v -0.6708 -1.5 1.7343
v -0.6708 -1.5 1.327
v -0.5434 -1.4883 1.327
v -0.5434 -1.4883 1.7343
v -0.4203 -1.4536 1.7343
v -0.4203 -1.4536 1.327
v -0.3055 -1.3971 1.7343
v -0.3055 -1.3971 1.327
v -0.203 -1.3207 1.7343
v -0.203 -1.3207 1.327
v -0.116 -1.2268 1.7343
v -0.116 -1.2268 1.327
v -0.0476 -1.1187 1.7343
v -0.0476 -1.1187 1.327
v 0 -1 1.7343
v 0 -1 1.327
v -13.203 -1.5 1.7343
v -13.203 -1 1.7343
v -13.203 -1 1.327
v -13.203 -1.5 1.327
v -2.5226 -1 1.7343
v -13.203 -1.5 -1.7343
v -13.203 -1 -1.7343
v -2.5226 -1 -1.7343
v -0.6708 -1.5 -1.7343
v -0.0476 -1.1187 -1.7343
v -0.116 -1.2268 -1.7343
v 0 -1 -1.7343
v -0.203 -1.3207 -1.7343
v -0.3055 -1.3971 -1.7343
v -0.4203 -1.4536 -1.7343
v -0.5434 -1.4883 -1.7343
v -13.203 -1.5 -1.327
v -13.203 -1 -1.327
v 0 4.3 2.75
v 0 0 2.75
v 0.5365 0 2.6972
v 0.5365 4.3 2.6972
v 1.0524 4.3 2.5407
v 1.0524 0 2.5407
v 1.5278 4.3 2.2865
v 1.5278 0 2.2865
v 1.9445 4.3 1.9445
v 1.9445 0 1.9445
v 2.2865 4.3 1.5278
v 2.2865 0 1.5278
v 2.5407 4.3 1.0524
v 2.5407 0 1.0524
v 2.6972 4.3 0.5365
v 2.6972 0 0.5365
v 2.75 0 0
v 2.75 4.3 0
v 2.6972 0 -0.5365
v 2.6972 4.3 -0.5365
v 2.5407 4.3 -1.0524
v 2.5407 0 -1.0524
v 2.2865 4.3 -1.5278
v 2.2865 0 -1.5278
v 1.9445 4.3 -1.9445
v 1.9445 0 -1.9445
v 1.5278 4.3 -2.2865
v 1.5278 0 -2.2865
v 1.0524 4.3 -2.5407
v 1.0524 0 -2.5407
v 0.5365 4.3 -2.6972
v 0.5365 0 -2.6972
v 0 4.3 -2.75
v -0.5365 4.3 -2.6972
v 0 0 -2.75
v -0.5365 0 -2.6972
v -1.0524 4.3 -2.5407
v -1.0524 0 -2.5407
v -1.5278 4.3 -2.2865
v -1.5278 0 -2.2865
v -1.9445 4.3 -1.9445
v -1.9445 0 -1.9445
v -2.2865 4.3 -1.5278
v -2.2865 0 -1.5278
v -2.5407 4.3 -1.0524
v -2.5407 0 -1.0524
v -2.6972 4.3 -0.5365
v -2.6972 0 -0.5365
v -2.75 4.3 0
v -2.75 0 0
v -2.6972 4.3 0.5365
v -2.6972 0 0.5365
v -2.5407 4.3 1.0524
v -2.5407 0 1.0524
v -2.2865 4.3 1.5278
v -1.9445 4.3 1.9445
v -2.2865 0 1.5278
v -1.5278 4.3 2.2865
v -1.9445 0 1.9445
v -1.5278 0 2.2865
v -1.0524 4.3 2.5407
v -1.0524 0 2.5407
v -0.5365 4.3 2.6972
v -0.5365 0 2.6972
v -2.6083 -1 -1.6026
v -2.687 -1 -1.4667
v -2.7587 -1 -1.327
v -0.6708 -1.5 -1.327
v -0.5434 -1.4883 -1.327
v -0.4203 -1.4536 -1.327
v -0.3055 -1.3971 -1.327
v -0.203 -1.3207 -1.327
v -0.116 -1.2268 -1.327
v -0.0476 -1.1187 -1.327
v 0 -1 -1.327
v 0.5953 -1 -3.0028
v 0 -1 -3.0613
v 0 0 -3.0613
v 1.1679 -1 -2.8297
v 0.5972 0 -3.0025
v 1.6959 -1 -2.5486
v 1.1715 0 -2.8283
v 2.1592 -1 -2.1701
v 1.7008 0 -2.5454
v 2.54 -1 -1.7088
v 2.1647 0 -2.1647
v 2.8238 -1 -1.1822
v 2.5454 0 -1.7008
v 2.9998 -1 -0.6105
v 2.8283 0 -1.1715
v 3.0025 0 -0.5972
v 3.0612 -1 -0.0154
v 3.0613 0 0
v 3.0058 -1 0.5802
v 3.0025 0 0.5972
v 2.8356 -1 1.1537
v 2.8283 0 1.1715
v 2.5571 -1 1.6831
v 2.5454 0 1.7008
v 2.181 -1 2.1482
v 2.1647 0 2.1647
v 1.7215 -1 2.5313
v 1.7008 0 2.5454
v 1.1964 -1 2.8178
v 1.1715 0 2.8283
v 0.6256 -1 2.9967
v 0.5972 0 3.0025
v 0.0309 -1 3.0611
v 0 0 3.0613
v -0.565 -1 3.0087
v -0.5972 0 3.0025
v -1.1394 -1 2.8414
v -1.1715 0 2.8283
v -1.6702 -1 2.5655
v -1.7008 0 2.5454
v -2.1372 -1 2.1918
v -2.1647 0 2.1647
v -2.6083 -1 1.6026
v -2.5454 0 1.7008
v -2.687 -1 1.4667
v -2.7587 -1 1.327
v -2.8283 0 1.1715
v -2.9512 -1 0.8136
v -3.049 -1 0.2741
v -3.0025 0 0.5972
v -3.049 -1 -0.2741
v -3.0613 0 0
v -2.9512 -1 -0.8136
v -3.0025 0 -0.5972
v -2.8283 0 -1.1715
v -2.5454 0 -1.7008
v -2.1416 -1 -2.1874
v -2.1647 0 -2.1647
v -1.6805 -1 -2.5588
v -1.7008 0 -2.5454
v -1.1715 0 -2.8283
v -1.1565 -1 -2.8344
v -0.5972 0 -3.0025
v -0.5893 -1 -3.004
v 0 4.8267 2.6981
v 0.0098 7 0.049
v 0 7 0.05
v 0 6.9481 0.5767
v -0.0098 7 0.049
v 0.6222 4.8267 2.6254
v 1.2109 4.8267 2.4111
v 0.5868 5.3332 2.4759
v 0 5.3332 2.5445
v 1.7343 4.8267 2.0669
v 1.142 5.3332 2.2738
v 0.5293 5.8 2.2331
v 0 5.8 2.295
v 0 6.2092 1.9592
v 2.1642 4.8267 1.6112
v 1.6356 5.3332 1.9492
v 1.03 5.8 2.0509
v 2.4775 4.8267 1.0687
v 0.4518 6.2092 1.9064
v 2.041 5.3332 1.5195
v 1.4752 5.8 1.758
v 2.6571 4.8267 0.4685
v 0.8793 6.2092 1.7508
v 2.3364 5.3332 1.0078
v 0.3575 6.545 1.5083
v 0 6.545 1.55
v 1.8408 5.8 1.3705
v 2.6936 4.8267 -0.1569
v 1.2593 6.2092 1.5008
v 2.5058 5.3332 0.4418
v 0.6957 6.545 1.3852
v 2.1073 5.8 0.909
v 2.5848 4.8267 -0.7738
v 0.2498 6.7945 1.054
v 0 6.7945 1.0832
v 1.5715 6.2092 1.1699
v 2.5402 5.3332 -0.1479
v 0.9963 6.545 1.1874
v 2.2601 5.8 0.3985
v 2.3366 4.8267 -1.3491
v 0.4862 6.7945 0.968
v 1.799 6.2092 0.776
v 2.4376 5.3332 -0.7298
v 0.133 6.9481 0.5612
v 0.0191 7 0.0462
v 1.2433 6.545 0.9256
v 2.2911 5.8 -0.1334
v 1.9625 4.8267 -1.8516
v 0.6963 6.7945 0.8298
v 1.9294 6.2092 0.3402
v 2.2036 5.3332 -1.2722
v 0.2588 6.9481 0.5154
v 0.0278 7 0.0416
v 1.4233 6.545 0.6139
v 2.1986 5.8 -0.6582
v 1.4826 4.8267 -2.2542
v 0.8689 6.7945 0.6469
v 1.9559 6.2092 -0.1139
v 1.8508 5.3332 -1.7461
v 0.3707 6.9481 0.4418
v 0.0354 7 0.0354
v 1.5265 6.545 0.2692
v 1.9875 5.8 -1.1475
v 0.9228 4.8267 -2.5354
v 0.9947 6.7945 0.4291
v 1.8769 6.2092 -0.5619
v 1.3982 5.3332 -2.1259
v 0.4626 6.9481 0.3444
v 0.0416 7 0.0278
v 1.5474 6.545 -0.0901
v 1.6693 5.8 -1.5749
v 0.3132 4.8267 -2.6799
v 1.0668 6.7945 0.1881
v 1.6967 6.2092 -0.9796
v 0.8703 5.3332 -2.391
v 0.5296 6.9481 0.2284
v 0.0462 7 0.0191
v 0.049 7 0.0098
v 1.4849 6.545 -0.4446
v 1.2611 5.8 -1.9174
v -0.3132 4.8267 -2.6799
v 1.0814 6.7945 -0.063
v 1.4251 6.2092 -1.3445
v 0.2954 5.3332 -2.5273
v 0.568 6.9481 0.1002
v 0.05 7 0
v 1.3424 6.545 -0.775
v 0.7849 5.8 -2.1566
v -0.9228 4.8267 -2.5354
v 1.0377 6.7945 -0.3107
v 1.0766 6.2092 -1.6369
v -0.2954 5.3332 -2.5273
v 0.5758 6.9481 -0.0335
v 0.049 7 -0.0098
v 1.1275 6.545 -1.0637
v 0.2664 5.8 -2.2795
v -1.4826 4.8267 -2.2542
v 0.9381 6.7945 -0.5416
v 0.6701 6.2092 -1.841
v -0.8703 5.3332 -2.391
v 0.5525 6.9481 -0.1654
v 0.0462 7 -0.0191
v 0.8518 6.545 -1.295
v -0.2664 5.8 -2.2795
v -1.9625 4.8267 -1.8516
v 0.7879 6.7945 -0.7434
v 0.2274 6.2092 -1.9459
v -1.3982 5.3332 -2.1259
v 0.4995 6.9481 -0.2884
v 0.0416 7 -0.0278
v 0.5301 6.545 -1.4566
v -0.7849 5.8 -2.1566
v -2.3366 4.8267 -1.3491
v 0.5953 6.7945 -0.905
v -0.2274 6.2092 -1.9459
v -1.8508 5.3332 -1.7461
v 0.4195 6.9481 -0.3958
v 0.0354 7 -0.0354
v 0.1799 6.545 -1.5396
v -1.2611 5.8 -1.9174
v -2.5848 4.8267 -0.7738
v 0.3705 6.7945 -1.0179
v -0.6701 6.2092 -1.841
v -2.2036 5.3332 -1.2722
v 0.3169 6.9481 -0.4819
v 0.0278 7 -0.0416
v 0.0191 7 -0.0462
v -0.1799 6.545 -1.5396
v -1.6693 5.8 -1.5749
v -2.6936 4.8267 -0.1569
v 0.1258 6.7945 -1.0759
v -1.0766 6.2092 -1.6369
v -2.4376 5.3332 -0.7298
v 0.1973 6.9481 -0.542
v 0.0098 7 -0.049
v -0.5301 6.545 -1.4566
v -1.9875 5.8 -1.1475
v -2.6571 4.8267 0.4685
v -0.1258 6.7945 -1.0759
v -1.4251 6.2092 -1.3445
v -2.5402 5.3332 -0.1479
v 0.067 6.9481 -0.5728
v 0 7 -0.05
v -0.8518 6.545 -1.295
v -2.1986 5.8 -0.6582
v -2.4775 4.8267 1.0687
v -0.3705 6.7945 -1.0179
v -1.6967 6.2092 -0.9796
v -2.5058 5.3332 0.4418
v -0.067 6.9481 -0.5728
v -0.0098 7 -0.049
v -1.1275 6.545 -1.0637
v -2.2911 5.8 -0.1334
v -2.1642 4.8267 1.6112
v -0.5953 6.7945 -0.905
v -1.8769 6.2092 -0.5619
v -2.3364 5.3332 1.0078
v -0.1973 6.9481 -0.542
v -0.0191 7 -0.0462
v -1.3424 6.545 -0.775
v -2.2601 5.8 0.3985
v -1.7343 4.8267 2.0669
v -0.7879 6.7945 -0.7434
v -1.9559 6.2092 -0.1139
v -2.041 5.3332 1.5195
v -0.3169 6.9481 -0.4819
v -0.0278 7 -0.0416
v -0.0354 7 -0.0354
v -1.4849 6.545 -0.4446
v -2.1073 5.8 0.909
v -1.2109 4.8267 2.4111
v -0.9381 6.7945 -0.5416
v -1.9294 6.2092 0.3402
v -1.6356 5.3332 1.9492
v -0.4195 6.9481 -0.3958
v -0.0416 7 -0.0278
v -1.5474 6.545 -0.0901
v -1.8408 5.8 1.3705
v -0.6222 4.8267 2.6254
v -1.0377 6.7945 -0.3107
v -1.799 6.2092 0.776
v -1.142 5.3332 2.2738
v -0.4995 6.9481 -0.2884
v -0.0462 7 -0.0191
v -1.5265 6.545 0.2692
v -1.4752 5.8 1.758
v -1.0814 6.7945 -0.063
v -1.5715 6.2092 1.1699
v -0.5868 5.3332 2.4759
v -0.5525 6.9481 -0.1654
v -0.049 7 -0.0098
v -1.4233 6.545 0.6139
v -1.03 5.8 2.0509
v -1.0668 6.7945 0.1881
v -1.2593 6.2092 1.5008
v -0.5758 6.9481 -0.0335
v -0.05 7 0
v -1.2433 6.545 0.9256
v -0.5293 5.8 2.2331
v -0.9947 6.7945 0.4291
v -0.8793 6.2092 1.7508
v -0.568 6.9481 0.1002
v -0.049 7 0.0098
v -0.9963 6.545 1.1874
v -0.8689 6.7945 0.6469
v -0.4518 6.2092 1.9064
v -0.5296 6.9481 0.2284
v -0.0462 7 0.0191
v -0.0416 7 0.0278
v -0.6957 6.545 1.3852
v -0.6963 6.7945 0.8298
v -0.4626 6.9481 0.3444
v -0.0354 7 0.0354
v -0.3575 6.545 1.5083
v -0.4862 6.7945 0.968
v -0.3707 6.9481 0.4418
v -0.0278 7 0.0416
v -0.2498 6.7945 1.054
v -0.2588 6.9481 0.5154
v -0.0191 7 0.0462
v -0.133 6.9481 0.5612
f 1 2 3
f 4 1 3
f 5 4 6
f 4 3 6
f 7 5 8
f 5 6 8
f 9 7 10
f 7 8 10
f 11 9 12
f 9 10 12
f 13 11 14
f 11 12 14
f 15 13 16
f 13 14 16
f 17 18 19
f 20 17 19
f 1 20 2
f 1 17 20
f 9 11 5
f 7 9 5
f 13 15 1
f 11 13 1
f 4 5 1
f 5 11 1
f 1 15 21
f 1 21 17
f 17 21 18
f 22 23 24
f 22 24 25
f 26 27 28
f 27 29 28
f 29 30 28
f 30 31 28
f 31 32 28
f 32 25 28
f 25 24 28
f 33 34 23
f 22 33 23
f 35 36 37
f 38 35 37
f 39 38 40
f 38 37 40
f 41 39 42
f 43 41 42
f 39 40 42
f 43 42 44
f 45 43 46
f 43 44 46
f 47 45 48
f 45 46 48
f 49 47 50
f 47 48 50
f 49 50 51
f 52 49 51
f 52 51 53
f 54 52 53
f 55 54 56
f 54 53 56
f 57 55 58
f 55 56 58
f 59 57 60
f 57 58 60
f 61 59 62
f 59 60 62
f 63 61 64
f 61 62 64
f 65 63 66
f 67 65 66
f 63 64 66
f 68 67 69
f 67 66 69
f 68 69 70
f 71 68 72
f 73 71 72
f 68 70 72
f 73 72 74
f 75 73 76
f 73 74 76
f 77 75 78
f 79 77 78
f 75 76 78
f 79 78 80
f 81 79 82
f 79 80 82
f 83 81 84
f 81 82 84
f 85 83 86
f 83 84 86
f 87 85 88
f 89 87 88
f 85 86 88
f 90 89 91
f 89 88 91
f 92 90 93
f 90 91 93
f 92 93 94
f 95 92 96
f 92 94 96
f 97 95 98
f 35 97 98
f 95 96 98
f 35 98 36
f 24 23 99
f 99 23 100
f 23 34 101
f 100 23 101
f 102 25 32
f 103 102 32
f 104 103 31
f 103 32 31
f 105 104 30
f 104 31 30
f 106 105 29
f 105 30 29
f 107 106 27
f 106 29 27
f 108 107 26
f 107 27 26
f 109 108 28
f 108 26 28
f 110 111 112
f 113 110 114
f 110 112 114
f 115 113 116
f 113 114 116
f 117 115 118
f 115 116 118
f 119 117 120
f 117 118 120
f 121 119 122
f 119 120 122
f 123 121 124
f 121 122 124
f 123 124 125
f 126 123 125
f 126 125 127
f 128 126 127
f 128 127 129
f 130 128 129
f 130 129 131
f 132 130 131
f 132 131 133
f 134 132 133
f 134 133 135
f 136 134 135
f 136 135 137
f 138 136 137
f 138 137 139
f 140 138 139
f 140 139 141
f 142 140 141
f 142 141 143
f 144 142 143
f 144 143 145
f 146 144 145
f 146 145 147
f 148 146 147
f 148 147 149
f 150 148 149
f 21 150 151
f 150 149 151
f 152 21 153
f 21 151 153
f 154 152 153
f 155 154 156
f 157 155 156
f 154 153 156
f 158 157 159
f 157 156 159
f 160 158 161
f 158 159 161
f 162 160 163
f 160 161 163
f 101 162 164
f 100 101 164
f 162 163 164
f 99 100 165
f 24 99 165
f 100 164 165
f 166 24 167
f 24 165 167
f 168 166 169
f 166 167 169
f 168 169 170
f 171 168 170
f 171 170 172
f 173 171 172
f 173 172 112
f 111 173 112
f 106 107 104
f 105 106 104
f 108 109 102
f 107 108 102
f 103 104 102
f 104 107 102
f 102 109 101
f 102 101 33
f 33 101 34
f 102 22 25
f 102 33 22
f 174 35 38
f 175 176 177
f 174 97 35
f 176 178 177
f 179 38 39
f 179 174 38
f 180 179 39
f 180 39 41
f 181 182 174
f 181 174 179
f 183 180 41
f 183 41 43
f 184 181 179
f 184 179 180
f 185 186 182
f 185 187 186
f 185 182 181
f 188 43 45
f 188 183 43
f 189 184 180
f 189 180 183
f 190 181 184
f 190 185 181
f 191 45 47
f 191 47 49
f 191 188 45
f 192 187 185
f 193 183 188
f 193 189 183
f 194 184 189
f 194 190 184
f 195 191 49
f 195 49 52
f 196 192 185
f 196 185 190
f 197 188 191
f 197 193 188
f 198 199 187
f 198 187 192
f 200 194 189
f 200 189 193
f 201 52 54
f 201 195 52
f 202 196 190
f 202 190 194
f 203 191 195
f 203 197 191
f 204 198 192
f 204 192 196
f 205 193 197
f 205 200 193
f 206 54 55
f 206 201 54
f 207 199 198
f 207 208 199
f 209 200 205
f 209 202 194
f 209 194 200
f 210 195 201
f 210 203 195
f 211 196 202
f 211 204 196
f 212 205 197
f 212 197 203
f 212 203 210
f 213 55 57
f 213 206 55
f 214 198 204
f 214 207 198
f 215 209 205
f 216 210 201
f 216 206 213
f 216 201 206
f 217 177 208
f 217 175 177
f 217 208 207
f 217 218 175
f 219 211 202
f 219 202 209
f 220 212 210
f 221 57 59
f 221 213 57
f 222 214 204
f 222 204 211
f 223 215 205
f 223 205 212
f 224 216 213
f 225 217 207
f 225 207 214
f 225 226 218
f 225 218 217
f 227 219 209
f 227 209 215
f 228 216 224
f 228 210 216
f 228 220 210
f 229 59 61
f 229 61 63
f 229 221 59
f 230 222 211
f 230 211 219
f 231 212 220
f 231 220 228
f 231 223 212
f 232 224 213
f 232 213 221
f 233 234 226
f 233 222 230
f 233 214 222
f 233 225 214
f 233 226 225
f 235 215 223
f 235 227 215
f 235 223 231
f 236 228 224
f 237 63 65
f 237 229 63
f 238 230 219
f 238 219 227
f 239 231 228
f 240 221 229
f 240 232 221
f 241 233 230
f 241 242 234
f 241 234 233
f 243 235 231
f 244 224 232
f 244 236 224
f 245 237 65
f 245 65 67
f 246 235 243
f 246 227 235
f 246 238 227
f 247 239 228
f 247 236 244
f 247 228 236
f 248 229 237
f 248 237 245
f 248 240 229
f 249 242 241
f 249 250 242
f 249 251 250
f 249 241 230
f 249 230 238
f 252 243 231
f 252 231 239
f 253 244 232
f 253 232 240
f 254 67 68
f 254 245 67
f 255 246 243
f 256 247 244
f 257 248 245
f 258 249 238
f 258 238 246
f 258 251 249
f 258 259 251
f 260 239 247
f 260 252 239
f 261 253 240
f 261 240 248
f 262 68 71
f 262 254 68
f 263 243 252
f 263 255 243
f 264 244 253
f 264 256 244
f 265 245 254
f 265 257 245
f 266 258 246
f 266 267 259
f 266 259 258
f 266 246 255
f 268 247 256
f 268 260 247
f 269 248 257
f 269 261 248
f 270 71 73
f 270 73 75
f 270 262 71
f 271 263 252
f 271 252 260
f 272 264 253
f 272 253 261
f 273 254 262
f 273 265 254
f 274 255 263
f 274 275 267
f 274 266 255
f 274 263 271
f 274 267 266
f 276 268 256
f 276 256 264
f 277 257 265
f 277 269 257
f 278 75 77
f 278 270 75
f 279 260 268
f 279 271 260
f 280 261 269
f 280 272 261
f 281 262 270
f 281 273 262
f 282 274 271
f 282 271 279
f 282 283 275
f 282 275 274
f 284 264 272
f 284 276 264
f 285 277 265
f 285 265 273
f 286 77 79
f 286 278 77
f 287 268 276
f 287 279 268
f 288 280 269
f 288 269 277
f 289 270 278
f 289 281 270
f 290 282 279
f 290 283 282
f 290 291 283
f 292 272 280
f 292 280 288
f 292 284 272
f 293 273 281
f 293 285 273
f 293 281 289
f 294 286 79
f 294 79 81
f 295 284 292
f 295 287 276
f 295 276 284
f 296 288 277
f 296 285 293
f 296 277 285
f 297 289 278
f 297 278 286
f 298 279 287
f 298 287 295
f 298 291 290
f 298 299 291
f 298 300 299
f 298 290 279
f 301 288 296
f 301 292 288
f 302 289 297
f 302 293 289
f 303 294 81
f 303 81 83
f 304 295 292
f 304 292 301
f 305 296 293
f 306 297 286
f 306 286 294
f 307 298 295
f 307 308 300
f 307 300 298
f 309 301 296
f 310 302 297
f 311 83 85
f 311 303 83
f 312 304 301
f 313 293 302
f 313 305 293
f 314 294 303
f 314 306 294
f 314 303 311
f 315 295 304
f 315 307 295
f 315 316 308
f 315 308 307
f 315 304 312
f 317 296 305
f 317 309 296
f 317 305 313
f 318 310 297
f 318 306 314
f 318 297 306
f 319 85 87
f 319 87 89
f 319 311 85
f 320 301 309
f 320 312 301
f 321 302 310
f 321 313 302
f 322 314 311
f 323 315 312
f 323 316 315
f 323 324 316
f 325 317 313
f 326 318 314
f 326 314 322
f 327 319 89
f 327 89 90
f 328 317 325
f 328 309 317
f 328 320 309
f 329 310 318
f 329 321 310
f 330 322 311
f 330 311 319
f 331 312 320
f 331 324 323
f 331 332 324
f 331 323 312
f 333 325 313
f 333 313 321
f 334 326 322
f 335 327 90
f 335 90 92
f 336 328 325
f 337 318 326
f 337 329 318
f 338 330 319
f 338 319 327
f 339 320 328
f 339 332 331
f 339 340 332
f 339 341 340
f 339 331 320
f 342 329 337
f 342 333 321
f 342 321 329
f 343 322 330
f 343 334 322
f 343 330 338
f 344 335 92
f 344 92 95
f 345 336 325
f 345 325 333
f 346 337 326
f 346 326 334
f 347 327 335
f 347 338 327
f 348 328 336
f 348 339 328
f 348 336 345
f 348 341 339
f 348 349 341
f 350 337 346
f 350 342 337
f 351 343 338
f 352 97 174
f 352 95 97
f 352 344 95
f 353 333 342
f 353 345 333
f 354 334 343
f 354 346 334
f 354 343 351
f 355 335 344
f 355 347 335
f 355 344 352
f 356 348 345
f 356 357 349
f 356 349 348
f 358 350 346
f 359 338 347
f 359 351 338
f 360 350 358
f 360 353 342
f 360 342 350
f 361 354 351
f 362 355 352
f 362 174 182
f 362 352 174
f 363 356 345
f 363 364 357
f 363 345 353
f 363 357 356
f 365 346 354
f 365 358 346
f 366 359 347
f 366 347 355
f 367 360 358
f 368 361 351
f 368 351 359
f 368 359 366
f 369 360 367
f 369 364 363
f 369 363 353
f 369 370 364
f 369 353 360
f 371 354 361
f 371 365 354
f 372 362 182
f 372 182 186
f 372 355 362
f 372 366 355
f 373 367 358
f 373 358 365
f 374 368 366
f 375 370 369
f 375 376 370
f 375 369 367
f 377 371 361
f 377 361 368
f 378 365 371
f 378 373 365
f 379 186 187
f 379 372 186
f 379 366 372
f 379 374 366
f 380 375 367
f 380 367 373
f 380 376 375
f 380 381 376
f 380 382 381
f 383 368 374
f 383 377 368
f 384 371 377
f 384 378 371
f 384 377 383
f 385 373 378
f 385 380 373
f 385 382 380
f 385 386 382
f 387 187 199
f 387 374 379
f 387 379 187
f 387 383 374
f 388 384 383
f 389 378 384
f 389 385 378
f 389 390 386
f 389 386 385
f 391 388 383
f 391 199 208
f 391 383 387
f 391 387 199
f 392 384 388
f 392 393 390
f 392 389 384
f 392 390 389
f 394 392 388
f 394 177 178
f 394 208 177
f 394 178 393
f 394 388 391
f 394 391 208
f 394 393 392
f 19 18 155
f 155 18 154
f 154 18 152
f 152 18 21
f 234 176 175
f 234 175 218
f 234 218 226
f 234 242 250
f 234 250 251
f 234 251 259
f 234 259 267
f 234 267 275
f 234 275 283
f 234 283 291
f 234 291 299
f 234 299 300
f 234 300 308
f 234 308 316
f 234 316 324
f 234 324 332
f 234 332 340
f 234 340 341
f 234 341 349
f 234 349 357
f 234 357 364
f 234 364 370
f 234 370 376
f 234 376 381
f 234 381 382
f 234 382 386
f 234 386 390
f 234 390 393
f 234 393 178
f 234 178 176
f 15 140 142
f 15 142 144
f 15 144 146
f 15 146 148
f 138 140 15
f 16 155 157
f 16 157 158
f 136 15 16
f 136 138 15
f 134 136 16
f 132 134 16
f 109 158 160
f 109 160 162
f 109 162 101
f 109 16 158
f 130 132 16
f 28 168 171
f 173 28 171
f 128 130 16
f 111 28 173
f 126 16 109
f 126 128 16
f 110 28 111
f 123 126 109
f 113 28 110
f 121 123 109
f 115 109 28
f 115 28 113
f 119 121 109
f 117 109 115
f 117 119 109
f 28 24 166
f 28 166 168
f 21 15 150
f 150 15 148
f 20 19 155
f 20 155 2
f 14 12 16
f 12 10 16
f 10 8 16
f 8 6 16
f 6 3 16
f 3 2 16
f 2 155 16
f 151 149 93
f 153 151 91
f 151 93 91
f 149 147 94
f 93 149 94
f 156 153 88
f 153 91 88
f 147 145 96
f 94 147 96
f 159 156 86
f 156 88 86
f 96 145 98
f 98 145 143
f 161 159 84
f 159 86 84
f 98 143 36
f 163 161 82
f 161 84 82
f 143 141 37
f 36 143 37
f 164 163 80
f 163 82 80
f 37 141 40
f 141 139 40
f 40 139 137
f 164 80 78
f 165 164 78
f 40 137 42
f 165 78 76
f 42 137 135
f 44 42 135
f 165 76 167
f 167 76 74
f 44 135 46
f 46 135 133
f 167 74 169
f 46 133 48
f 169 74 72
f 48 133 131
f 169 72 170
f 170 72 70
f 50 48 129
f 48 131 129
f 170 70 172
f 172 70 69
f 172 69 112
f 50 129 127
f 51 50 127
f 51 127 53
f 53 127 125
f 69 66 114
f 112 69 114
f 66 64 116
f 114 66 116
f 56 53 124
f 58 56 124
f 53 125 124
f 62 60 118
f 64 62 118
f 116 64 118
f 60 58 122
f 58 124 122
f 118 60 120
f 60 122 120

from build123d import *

# Parameters (mm, degrees)
SKETCH1_R           = 2.75
BOSS_EXTRUDE1_DEPTH = 7
FILLET1_R           = 2.7
SKETCH2_R           = 3.061280108
BOSS_EXTRUDE2_DEPTH = 1
BOSS_EXTRUDE3_DEPTH = 0.5
FILLET2_R           = 0.7


with BuildPart() as part:
    # Sketch1 → Boss-Extrude1 (new body)
    with BuildSketch(Plane(origin=(0, 0, 0), x_dir=(1, 0, 0), z_dir=(0, 1, 0))):
        with Locations(Location((0, 0, 0), (0, 0, 270))):
            Circle(SKETCH1_R)
    extrude(amount=BOSS_EXTRUDE1_DEPTH)

    # Fillet1
    fillet1_edges = [part.edges().sort_by_distance(p)[0] for p in [
        (0, 7, -2.75),
    ]]
    fillet(fillet1_edges, radius=FILLET1_R)

    # Sketch2 → Boss-Extrude2 (add)
    with BuildSketch(Plane.XZ):
        with Locations(Location((0, 0, 0), (0, 0, 270))):
            Circle(SKETCH2_R)
    extrude(amount=BOSS_EXTRUDE2_DEPTH)

    # Sketch3 → Boss-Extrude3 (add)
    with BuildSketch(Plane.XZ.offset(1)):
        with BuildLine():
            ThreePointArc((-2.522635735, 1.734285112), (-2.648517192, 1.535184868), (-2.758717126, 1.326994996))
            Line((-2.758717126, 1.326994996), (0, 1.326994996))
            Line((0, 1.326994996), (0, 1.734285112))
            Line((0, 1.734285112), (-2.522635735, 1.734285112))
        make_face()
        with BuildLine():
            Line((-13.203045703, 1.326994996), (-2.758717126, 1.326994996))
            ThreePointArc((-2.758717126, 1.326994996), (-2.648517192, 1.535184868), (-2.522635735, 1.734285112))
            Line((-2.522635735, 1.734285112), (-13.203045703, 1.734285112))
            Line((-13.203045703, 1.734285112), (-13.203045703, 1.326994996))
        make_face()
        with BuildLine():
            Line((-2.522635735, -1.734285112), (0, -1.734285112))
            Line((0, -1.734285112), (0, -1.326994996))
            Line((0, -1.326994996), (-2.758717126, -1.326994996))
            ThreePointArc((-2.758717126, -1.326994996), (-2.648517192, -1.535184868), (-2.522635735, -1.734285112))
        make_face()
        with BuildLine():
            Line((-13.203045703, -1.734285112), (-2.522635735, -1.734285112))
            ThreePointArc((-2.522635735, -1.734285112), (-2.648517192, -1.535184868), (-2.758717126, -1.326994996))
            Line((-2.758717126, -1.326994996), (-13.203045703, -1.326994996))
            Line((-13.203045703, -1.326994996), (-13.203045703, -1.734285112))
        make_face()
    extrude(amount=BOSS_EXTRUDE3_DEPTH)

    # Fillet2
    # the kernel refuses this fillet: 0.7 mm, written as the material it takes off along each edge
    with BuildSketch(Plane(origin=(0, -1.5, -3.411336095), x_dir=(0, 1, 0), z_dir=(0, 0, 1)), Plane(origin=(0, -1.5, -0.350055987), x_dir=(0, 1, 0), z_dir=(0, 0, 1))) as fillet2_piece_1:
        with BuildLine():
            CenterArc((0.7, 0.670820393), FILLET2_R, 180, 73.398450401)
            Line((0, 0.670820393), (-0.014, 0.670820393))
            Line((-0.014, 0.670820393), (-0.014, 0))
            Line((-0.014, 0), (0, -0.014))
            ThreePointArc((0, -0.014), (0.25, -0.014), (0.496, -0.013416408))
            Line((0.496, -0.013416408), (0.5, 0))
        make_face()
    extrude(amount=3.761392082, mode=Mode.SUBTRACT)


solid = part.part
